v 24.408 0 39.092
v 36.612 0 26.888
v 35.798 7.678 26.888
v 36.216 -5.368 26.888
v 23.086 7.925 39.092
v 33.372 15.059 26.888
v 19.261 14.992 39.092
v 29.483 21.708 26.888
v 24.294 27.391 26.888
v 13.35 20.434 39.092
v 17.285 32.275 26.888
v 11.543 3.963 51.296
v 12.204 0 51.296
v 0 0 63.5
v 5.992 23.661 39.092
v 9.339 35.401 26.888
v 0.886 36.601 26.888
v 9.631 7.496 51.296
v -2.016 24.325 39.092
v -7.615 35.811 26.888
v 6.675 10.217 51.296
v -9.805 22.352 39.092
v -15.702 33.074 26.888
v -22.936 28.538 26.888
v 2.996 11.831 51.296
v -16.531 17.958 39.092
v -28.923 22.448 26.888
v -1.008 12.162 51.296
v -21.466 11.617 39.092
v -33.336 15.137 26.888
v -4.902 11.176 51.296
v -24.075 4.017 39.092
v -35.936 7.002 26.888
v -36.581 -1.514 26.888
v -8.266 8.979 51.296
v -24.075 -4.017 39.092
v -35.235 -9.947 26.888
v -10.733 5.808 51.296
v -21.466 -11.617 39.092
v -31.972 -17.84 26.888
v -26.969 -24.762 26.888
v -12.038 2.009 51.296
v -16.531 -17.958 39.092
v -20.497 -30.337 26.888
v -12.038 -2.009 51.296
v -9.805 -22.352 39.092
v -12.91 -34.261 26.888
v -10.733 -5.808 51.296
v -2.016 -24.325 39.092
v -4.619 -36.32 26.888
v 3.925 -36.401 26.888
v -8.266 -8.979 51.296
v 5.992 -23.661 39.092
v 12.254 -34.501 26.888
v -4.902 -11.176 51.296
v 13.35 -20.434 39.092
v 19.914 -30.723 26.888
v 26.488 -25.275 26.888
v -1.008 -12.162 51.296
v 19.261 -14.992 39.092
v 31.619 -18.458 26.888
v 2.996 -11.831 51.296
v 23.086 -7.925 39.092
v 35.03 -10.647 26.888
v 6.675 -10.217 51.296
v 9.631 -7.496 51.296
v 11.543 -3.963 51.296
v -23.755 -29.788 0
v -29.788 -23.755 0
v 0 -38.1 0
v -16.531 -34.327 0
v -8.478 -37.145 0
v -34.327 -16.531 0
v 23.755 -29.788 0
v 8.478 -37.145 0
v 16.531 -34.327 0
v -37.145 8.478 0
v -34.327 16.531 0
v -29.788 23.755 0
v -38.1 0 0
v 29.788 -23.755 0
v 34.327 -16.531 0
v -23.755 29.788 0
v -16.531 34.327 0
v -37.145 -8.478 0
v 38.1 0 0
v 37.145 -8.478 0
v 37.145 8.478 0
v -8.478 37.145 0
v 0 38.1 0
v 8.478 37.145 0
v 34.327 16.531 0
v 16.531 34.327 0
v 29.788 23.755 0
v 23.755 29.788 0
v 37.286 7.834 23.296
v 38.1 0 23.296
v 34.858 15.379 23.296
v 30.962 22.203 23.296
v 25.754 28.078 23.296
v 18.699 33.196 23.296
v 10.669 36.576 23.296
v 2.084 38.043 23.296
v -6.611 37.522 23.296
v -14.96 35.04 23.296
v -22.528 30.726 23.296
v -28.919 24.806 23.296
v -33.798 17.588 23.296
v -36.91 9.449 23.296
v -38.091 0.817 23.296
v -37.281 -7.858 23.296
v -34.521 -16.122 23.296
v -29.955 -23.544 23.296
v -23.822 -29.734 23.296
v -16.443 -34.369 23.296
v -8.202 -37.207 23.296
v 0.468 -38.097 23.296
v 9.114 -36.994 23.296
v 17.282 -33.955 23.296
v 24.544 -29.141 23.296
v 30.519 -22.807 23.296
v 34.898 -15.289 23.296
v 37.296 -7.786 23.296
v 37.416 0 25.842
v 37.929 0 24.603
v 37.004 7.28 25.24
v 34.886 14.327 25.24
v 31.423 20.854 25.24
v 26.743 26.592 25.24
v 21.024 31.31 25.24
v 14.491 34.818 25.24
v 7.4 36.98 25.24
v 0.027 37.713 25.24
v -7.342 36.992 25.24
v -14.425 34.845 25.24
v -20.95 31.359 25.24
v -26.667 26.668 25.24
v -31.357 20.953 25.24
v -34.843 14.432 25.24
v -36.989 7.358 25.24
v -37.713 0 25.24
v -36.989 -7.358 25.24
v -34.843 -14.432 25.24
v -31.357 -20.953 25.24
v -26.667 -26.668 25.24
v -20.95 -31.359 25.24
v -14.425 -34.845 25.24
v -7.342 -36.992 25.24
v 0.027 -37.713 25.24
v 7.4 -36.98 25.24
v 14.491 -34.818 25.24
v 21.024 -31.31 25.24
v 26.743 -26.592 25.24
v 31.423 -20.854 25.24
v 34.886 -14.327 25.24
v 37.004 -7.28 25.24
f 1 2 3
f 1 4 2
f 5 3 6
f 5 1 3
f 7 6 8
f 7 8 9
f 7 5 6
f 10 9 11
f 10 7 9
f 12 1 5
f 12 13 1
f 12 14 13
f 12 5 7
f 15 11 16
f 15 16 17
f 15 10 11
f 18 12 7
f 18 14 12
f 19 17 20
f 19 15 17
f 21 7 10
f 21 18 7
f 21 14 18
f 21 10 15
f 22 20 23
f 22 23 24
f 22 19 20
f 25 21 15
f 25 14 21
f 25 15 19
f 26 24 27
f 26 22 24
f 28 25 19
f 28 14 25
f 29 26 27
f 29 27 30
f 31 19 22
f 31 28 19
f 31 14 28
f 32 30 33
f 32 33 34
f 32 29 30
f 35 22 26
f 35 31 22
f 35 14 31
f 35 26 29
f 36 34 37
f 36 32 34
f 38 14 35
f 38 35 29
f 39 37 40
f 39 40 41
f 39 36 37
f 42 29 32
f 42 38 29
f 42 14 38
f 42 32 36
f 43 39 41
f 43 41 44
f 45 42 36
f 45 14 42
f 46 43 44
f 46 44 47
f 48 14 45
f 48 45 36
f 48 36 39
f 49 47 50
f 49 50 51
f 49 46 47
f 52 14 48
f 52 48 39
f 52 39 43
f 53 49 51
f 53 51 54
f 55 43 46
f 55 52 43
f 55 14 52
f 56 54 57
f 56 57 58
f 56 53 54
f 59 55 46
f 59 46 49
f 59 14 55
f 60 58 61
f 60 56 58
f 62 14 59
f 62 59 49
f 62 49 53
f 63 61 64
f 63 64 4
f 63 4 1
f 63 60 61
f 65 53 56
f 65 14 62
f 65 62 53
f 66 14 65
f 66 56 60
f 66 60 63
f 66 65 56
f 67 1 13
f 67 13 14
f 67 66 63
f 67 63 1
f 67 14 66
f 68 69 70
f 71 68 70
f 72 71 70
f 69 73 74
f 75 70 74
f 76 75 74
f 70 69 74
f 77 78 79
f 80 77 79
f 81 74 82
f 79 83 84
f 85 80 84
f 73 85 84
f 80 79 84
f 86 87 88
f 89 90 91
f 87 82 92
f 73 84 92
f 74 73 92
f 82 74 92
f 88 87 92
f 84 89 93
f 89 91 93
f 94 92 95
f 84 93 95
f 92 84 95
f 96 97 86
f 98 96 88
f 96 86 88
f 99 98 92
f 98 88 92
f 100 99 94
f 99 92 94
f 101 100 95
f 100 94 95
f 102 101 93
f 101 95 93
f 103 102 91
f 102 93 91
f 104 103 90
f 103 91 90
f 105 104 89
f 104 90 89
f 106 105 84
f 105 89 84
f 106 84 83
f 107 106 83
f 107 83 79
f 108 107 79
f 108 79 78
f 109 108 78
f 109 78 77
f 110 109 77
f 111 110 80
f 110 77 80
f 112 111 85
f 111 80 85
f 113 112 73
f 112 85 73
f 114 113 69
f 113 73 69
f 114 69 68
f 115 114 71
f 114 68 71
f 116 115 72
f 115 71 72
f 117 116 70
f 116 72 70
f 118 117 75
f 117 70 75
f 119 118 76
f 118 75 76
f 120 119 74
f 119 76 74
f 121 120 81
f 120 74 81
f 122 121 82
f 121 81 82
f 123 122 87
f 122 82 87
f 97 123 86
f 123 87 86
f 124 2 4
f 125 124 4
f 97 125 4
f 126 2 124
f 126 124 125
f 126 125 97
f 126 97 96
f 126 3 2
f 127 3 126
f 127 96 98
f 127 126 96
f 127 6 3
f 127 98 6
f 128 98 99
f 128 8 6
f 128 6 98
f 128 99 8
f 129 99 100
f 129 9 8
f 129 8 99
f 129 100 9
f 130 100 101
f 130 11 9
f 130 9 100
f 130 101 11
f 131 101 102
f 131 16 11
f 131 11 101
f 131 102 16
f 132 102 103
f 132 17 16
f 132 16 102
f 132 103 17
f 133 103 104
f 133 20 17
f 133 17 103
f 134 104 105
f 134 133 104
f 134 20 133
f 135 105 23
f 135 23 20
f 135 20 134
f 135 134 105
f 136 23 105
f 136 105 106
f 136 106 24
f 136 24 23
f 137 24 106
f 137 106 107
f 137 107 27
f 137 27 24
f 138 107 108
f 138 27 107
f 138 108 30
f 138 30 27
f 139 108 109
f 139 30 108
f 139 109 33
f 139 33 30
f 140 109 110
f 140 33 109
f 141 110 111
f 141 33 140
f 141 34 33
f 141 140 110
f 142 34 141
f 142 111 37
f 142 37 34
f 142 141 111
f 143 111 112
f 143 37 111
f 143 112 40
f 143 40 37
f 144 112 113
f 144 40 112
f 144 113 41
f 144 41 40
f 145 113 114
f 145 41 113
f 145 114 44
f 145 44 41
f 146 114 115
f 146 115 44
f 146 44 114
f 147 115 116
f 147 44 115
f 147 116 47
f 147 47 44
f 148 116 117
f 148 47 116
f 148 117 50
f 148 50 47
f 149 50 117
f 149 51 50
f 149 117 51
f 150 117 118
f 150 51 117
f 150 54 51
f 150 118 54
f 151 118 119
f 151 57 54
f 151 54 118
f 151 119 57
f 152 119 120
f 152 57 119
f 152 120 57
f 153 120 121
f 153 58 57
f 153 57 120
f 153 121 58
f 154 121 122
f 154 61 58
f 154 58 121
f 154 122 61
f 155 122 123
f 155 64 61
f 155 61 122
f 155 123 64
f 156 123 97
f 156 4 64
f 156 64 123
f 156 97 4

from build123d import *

# Parameters (mm, degrees)
F0_R     = 38.1
F1_DEPTH = 25.4
F2_R     = 38.1
F3_DEPTH = 38.1
F3_TAPER = 45
F4_R     = 5.08


with BuildPart() as f1:
    # F0 (on Top) → F1 (new body)
    with BuildSketch(Plane.XY):
        Circle(F0_R)
    extrude(amount=F1_DEPTH)

    # F2 (on face) → F3 (join)
    with BuildSketch(Plane.XY.offset(25.4)):
        Circle(F2_R)
    extrude(amount=F3_DEPTH, taper=F3_TAPER)

    # F4
    f4_edges = [f1.edges().sort_by_distance(p)[0] for p in [
        (-38.1, 0, 25.4),
    ]]
    fillet(f4_edges, radius=F4_R)


solid = f1.part
